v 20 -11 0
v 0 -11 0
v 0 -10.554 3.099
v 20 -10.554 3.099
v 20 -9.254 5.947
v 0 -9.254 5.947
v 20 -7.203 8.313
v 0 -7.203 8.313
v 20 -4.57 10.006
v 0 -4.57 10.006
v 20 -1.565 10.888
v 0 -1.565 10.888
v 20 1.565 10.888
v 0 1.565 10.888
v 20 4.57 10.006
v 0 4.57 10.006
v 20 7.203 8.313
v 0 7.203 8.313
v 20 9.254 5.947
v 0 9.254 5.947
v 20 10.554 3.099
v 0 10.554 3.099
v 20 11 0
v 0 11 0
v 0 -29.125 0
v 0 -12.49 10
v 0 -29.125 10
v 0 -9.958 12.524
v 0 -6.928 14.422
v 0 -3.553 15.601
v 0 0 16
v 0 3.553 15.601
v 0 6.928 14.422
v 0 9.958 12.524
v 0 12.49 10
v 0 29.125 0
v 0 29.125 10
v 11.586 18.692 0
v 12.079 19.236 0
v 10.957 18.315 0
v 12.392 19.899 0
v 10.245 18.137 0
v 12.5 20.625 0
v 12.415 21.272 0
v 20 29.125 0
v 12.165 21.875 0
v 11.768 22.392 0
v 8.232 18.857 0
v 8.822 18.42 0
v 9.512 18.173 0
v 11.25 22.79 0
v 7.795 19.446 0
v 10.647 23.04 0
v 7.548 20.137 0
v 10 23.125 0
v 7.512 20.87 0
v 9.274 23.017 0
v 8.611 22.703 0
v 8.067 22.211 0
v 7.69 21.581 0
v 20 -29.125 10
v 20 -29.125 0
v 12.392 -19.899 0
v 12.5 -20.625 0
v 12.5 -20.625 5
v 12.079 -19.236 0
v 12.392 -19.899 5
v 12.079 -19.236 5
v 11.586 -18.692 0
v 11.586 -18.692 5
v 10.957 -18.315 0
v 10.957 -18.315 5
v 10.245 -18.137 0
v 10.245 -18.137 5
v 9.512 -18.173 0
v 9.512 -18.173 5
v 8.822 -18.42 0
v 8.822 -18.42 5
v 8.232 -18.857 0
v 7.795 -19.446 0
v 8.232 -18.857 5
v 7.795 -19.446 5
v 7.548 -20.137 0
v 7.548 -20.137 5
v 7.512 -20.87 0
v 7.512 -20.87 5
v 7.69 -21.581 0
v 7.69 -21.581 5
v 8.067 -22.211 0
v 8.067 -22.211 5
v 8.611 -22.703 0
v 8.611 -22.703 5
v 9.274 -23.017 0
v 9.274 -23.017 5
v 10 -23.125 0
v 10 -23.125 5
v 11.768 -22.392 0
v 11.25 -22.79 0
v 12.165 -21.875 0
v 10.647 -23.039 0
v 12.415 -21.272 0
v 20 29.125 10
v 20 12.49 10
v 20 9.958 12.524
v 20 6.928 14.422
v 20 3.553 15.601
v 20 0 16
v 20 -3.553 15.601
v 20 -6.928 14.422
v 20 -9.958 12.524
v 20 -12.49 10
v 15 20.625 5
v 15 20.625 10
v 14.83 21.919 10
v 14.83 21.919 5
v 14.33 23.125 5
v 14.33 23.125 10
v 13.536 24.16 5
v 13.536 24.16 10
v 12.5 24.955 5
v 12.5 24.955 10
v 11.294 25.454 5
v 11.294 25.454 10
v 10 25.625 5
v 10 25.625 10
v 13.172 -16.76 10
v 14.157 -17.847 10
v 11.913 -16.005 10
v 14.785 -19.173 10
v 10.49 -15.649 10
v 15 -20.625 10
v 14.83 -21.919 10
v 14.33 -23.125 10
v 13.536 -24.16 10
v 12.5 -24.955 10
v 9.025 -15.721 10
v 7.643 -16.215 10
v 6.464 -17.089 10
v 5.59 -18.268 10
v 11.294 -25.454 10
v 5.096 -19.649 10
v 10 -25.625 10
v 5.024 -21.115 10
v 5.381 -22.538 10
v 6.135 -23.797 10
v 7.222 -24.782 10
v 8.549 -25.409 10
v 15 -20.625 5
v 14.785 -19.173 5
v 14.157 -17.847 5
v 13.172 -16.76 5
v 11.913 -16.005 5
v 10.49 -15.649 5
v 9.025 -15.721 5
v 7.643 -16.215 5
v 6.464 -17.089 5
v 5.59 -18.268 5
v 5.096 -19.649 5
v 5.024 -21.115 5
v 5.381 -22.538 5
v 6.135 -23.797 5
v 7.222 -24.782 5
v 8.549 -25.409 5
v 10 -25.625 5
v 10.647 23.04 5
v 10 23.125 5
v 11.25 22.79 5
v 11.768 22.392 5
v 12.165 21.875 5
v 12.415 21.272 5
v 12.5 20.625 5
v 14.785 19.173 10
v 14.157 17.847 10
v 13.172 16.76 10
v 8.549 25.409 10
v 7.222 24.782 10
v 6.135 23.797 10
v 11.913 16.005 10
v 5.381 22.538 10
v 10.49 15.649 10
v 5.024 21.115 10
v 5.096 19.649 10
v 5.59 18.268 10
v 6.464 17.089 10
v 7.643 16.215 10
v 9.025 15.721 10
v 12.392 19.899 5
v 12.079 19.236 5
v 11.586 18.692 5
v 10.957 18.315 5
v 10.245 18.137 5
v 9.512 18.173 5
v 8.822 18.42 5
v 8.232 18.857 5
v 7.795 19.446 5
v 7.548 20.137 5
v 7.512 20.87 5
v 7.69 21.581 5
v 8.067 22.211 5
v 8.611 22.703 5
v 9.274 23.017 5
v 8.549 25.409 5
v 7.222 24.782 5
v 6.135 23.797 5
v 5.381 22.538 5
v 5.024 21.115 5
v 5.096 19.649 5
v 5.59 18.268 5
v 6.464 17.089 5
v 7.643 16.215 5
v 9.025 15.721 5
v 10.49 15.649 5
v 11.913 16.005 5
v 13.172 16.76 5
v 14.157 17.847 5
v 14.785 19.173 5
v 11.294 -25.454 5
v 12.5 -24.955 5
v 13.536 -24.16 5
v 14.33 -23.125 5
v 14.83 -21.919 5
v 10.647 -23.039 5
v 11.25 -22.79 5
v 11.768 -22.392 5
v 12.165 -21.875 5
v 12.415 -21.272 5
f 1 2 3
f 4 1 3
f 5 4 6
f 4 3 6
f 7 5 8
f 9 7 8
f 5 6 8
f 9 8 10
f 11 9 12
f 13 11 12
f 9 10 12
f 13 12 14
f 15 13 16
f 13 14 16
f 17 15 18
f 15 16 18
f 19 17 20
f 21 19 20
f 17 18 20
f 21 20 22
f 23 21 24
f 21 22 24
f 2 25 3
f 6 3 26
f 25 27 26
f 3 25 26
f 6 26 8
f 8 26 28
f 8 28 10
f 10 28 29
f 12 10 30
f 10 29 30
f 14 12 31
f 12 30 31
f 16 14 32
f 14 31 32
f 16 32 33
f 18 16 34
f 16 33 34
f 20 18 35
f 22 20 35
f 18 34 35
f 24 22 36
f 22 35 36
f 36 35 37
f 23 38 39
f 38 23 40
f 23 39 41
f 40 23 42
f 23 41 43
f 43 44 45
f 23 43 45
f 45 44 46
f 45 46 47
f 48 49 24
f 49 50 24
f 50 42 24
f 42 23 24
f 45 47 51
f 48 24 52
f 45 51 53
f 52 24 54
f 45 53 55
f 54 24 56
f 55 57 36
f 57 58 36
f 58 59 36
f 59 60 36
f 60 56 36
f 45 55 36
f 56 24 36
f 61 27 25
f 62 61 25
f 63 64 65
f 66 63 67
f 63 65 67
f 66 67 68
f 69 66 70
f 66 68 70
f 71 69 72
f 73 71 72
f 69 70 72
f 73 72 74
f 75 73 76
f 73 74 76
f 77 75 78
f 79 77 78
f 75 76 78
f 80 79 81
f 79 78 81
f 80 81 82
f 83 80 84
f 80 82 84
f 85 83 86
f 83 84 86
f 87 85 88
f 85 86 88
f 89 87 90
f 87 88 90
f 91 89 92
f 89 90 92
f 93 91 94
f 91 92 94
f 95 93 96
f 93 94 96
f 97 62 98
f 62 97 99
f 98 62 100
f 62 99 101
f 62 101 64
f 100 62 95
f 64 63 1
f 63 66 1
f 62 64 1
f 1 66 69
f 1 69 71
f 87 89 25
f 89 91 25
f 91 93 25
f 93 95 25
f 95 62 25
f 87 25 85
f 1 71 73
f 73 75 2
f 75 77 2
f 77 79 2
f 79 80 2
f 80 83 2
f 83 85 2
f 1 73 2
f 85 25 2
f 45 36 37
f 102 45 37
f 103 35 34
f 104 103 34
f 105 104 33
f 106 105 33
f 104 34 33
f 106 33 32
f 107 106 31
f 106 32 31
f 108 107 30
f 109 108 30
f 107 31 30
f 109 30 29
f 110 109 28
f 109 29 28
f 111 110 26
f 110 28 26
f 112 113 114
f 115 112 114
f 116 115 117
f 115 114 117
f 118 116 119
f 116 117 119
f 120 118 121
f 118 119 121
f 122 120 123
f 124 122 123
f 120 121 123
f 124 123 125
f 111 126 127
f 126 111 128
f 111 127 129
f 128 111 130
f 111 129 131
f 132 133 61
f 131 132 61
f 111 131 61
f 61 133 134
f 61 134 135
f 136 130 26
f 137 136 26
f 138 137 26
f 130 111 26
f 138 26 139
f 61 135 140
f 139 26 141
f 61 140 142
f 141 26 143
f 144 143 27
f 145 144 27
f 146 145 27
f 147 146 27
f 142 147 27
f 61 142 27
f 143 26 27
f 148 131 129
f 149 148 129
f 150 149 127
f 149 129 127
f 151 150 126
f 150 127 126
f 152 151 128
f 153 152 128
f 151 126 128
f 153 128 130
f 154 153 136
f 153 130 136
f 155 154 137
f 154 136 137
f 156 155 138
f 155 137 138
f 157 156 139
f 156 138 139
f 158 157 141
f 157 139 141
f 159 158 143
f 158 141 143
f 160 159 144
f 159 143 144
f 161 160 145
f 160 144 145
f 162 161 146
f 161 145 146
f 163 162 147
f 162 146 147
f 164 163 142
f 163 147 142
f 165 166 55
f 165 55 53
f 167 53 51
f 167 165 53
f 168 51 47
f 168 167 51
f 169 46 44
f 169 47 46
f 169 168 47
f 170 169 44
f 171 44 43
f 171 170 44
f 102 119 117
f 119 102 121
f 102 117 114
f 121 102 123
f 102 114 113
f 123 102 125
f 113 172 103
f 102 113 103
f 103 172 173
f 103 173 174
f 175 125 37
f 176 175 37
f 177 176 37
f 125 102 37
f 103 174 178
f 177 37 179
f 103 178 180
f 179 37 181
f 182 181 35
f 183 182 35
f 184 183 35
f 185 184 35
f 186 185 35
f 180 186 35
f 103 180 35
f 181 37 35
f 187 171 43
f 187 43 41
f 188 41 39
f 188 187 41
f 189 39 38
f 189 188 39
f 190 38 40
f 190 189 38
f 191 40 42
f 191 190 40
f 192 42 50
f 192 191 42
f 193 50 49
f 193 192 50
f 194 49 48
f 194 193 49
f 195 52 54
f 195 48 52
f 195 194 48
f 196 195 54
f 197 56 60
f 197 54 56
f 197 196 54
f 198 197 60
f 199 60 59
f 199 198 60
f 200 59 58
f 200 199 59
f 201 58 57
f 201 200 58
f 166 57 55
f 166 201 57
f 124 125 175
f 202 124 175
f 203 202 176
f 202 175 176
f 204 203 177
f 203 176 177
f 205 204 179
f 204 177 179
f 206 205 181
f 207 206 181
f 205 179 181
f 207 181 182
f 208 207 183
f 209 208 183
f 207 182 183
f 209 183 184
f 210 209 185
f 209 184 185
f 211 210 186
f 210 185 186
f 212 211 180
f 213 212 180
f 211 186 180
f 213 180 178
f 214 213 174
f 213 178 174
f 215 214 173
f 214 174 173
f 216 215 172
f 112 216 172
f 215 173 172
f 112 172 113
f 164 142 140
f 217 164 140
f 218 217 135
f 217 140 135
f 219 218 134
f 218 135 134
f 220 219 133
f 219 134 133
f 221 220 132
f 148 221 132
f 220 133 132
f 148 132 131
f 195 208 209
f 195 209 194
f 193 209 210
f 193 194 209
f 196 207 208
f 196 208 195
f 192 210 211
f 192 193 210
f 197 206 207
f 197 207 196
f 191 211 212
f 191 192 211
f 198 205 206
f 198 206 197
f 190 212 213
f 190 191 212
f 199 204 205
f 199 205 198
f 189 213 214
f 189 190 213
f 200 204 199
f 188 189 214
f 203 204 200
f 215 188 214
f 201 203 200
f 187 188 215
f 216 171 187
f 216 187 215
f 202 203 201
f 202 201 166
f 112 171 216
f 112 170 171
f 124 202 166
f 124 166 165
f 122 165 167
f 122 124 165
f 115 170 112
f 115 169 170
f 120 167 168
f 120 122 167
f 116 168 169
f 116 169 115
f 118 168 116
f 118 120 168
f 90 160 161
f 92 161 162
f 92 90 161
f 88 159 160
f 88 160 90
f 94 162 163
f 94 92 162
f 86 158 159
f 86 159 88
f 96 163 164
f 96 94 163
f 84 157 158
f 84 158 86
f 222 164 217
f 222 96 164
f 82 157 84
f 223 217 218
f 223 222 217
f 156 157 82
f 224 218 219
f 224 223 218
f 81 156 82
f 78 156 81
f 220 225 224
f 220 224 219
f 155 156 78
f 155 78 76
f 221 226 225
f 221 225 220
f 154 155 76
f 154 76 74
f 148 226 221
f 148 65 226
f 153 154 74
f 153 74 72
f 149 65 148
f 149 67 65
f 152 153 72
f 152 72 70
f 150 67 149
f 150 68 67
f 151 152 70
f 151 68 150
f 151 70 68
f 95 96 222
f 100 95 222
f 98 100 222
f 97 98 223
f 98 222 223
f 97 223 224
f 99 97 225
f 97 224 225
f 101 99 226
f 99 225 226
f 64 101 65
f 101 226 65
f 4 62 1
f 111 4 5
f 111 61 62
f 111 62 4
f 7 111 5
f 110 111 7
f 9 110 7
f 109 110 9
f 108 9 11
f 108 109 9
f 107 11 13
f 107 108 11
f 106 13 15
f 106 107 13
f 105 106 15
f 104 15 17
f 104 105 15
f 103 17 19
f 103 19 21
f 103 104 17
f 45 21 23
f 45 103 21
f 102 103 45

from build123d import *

# Parameters (mm, degrees)
F1_DEPTH = 20
F4_DEPTH = 5
F5_DEPTH = 25
F8_DEPTH = 5
F9_DEPTH = 25


with BuildPart() as f1:
    # F0 (on Right) → F1 (new body)
    with BuildSketch(Plane.YZ):
        with BuildLine():
            ThreePointArc((-11, 0), (0, 11), (11, 0))
            Line((11, 0), (29.125, 0))
            Line((29.125, 0), (29.125, 10))
            Line((29.125, 10), (12.4899959968, 10))
            ThreePointArc((12.4899959968, 10), (0, 16), (-12.4899959968, 10))
            Line((-12.4899959968, 10), (-29.125, 10))
            Line((-29.125, 10), (-29.125, 0))
            Line((-29.125, 0), (-11, 0))
        make_face()
    extrude(amount=F1_DEPTH)

    # F3 (on offset) → F4 (cut)
    with BuildSketch(Plane.XY.offset(10)):
        with BuildLine():
            ThreePointArc((15, -20.6245866863), (6.4644660941, -17.0890527804), (10, -25.6245866863))
            ThreePointArc((10, -25.6245866863), (13.5355339059, -24.1601205923), (15, -20.6245866863))
        make_face()
        with BuildLine():
            ThreePointArc((12.5, -20.6245866863), (11.767766953, -22.3923536393), (10, -23.1245866863))
            ThreePointArc((10, -23.1245866863), (8.232233047, -18.8568197334), (12.5, -20.6245866863))
        make_face(mode=Mode.SUBTRACT)
    extrude(amount=-F4_DEPTH, mode=Mode.SUBTRACT)

    # F3 (on offset) → F5 (cut)
    with BuildSketch(Plane.XY.offset(10)):
        with BuildLine():
            ThreePointArc((12.5, -20.6245866863), (8.232233047, -18.8568197334), (10, -23.1245866863))
            ThreePointArc((10, -23.1245866863), (11.767766953, -22.3923536393), (12.5, -20.6245866863))
        make_face()
    extrude(amount=-F5_DEPTH, mode=Mode.SUBTRACT)

    # F7 (on offset) → F8 (cut)
    with BuildSketch(Plane.XY.offset(10)):
        with BuildLine():
            ThreePointArc((15, 20.6246930474), (13.5355339059, 24.1602269533), (10, 25.6246930474))
            ThreePointArc((10, 25.6246930474), (6.4644660941, 17.0891591415), (15, 20.6246930474))
        make_face()
        with BuildLine():
            ThreePointArc((12.5, 20.6246930474), (8.232233047, 18.8569260944), (10, 23.1246930474))
            ThreePointArc((10, 23.1246930474), (11.767766953, 22.3924600004), (12.5, 20.6246930474))
        make_face(mode=Mode.SUBTRACT)
    extrude(amount=-F8_DEPTH, mode=Mode.SUBTRACT)

    # F9 (cut): a face of the model
    f9_faces = [f1.faces().sort_by_distance(p)[0] for p in [
        (10, 20.6246930474, 10),
    ]]
    extrude(f9_faces, amount=-F9_DEPTH, mode=Mode.SUBTRACT)


solid = f1.part
